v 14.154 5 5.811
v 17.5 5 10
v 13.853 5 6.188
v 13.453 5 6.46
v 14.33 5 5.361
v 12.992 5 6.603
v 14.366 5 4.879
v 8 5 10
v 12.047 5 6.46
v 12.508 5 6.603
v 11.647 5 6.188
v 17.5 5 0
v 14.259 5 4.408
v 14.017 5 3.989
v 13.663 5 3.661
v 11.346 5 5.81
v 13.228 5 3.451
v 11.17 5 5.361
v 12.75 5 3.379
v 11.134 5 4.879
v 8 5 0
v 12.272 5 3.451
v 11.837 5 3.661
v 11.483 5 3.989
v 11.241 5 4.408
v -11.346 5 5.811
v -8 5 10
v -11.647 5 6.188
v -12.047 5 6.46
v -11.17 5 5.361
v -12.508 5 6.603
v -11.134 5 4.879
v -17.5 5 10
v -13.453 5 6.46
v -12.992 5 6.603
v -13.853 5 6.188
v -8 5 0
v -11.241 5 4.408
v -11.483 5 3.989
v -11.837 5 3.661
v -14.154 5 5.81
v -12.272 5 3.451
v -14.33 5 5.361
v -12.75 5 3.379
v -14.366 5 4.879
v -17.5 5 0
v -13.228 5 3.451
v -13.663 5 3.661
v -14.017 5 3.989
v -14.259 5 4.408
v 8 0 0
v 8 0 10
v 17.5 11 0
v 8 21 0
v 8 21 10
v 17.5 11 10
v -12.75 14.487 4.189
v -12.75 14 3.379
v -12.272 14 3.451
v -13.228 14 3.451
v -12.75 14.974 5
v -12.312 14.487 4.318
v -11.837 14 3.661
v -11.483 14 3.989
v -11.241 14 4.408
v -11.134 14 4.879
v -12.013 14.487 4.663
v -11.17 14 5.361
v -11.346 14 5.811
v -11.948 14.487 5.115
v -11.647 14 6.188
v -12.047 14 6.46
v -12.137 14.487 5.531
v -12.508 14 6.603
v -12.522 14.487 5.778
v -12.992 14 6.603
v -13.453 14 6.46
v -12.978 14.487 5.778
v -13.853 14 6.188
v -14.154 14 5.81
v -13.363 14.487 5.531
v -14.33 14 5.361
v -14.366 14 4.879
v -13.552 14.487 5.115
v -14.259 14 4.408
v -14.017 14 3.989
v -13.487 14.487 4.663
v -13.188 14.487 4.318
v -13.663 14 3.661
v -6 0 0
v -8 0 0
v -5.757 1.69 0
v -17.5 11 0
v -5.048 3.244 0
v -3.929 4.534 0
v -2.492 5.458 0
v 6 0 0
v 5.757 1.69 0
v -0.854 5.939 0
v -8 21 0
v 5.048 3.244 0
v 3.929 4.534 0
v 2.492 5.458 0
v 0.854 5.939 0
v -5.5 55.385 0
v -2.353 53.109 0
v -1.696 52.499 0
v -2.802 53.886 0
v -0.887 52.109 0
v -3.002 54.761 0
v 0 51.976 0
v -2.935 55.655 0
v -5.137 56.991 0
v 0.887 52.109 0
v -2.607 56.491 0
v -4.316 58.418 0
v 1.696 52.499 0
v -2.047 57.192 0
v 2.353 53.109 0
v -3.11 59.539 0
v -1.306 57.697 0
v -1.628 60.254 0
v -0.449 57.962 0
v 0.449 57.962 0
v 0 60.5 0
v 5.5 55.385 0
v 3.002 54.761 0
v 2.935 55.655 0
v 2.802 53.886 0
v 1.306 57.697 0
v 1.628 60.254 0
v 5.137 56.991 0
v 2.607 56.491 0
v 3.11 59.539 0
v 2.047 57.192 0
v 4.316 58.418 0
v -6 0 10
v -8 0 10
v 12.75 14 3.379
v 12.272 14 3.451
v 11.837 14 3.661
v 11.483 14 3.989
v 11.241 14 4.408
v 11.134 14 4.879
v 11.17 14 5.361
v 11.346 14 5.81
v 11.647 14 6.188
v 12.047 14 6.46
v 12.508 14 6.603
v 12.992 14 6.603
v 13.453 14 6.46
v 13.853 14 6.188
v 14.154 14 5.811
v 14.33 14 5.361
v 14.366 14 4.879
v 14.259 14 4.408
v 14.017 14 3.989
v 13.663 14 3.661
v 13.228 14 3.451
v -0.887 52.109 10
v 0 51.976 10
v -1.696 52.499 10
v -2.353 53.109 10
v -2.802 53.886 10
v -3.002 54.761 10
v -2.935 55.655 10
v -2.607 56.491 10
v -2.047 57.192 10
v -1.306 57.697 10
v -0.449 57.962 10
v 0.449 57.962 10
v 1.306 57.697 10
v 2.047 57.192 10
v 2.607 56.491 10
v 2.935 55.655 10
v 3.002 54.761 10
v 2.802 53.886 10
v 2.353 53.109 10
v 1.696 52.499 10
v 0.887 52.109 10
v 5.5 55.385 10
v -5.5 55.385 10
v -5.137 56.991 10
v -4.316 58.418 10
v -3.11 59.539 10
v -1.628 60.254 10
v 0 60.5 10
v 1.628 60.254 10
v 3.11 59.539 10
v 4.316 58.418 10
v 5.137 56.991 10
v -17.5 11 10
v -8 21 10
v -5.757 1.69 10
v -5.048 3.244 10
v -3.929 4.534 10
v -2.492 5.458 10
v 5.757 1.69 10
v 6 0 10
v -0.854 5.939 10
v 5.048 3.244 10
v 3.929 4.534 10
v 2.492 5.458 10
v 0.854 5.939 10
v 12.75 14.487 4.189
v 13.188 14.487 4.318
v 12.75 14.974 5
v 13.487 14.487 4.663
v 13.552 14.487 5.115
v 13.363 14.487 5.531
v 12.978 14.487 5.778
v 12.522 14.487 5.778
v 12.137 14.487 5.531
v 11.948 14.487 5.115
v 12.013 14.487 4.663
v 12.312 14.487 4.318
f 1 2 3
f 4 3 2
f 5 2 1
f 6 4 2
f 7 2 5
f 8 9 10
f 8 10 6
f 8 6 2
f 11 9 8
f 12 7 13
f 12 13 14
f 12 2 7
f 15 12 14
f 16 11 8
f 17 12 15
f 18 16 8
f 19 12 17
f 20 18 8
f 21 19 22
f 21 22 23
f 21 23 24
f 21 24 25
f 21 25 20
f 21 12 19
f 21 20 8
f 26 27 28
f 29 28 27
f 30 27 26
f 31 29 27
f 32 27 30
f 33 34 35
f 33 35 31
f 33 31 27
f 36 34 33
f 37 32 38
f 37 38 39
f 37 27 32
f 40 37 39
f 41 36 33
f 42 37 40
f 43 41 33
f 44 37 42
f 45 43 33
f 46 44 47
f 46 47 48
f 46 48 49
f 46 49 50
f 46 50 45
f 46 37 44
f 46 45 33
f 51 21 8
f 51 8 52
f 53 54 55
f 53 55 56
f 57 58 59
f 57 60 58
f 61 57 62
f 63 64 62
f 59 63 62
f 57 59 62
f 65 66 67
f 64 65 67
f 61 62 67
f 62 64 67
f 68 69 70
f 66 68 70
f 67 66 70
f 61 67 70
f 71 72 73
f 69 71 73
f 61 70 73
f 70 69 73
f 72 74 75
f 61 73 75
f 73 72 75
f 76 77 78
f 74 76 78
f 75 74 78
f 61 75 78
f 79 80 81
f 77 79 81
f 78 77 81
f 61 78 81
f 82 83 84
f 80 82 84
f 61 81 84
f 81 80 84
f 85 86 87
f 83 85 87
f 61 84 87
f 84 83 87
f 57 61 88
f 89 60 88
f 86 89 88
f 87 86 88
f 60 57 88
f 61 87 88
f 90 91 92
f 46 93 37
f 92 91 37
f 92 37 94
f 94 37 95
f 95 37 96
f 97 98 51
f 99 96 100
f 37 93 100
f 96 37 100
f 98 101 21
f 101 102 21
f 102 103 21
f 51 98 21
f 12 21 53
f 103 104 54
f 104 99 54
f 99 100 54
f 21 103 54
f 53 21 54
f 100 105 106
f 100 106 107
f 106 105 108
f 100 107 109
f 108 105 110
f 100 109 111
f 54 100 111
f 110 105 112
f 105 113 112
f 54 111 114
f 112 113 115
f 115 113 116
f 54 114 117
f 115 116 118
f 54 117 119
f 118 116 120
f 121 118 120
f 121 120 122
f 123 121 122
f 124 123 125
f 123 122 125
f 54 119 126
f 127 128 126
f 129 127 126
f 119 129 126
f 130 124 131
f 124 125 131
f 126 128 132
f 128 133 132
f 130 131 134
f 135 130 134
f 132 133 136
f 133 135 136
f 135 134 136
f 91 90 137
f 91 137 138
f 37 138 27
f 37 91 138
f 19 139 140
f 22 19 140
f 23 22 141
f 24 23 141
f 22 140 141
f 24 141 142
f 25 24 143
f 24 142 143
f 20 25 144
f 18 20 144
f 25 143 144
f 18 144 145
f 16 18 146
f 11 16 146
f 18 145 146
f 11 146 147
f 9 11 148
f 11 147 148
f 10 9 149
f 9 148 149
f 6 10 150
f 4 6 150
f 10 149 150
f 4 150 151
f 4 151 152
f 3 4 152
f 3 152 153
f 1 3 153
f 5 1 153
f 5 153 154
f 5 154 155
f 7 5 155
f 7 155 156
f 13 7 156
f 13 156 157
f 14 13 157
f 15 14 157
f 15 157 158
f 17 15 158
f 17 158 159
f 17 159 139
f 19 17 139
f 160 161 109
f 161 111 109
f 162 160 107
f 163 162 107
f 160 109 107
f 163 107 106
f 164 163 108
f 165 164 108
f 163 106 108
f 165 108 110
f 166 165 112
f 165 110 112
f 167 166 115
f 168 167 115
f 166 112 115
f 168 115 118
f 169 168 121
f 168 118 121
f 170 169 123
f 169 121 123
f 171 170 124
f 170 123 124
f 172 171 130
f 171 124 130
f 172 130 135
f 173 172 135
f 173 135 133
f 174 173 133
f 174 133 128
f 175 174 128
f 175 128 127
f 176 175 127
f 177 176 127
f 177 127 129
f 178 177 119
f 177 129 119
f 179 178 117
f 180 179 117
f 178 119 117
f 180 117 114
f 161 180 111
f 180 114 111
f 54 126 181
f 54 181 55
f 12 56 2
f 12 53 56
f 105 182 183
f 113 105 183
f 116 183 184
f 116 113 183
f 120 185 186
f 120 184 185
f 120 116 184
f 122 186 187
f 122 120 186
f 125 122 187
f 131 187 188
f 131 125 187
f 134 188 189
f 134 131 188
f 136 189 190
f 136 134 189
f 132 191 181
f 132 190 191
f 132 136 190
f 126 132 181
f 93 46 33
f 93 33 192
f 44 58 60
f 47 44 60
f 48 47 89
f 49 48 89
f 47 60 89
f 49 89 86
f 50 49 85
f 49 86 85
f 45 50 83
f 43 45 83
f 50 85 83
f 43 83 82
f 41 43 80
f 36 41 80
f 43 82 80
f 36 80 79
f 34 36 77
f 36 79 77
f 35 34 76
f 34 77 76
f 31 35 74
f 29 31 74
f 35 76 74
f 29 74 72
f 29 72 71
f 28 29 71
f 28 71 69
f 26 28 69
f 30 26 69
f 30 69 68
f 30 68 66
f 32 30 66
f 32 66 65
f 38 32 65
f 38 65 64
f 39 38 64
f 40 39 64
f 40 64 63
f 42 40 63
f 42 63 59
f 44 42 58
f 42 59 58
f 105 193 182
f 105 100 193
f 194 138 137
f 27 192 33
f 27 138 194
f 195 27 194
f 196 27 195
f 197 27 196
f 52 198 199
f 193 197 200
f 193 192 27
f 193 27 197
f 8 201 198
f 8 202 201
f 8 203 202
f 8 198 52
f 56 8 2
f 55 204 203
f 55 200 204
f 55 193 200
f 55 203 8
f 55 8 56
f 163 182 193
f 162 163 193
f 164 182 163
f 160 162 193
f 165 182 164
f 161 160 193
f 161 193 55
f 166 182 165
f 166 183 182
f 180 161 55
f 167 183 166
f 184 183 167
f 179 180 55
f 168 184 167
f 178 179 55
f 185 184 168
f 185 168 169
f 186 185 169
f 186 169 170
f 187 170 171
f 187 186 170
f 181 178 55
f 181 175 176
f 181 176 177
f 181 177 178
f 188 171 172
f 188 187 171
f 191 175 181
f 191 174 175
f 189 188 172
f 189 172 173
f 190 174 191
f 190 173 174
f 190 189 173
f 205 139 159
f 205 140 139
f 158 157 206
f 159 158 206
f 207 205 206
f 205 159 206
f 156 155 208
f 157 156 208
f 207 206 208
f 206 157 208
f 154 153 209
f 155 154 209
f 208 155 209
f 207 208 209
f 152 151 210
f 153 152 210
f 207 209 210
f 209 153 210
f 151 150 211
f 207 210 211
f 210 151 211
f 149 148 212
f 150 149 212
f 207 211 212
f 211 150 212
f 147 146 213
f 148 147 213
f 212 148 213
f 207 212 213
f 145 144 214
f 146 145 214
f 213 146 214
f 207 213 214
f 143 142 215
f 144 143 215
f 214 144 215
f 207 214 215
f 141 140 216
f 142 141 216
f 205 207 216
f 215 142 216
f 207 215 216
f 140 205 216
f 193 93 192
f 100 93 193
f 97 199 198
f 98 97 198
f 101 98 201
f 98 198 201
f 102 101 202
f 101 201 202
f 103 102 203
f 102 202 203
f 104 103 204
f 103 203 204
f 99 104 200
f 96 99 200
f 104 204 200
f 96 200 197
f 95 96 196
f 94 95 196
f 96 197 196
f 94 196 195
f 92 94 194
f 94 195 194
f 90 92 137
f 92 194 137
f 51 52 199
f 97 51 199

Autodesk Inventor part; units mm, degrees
ref_plane "YZ Plane" through (0, 0, 0) normal (1, 0, 0) x (0, 1, 0)
ref_plane "XZ Plane" through (0, 0, 0) normal (0, 1, 0) x (-1, 0, 0)
ref_plane "XY Plane" through (0, 0, 0) normal (0, 0, 1) x (1, 0, 0)
sketch "Skizze1" plane through (0, 0, 0) normal (0, 0, 1) x (1, 0, 0)
  line L0 (0, 0) -> (0, 60.5) construction
  line L1 (0, 0) -> (-8, 0)
  line L2 (-8, 0) -> (-8, 5)
  line L3 (-8, 5) -> (-17.5, 5)
  line L4 (-17.5, 5) -> (-17.5, 11)
  line L5 (-17.5, 11) -> (-8, 21)
  line L6 (-8, 21) -> (-5.5, 55.3854)
  arc A0 (5.5, 55.3854) -> (-5.5, 55.3854) centre (0, 54.9855) ccw
  line L7 (5.5, 55.3854) -> (8, 21)
  line L8 (8, 21) -> (17.5, 11)
  line L9 (17.5, 11) -> (17.5, 5)
  line L10 (17.5, 5) -> (8, 5)
  line L11 (8, 5) -> (8, 0)
  line L12 (8, 0) -> (0, 0)
  dimension "d6" = 60.5
  dimension "d7" = 16
  dimension "d8" = 5
  dimension "d9" = 11
  dimension "d10" = 35
  dimension "d11" = 11
  dimension "d12" = 21
extrude "Extrusion1" add sketch "Skizze1" along normal blind 10
sketch "Skizze2" plane through (0, 0, 10) normal (0, 0, 1) x (1, 0, 0)
  line L0 (-8, 0) -> (8, 0) projected
  arc A0 (6, 0) -> (-6, 0) centre (0, 0) ccw
  point P0 (0, 0)
  dimension "d15" = 12
extrude "Extrusion2" cut sketch "Skizze2" against normal blind 10
sketch "Skizze3" plane through (-17.5, 5, 0) normal (0, -1, 0) x (1, 0, 0)
  line L0 (17.5, 0) -> (17.5, 10) construction
  line L1 (11.5, 10) -> (23.5, 10) projected
  line L2 (0, 0) -> (0, 10) projected
  point P0 (4.75, 5)
  point P1 (30.25, 5)
  point P2 (0, 5)
  dimension "d18" = 25.5
hole "Bohrung1" at (-12.75, 5, 5) at (12.75, 5, 5) direction (0, 1, 0) diameter 3.242 depth 9 tip angle 118 thread size "M4x0.7" class "6H" standard "ISO Metric profile"
sketch "Skizze4" plane through (0, 0, 10) normal (0, 0, 1) x (1, 0, 0)
  arc A0 (5.5, 55.3854) -> (-5.5, 55.3854) centre (0, 54.9855) ccw projected
  point P0 (0, 0)
hole "Bohrung2" at (0, 54.9855, 10) direction (0, 0, -1) diameter 6.02 end through all
properties part number "Pleuel_oberteil" material "Stahl, galvanisiert"
